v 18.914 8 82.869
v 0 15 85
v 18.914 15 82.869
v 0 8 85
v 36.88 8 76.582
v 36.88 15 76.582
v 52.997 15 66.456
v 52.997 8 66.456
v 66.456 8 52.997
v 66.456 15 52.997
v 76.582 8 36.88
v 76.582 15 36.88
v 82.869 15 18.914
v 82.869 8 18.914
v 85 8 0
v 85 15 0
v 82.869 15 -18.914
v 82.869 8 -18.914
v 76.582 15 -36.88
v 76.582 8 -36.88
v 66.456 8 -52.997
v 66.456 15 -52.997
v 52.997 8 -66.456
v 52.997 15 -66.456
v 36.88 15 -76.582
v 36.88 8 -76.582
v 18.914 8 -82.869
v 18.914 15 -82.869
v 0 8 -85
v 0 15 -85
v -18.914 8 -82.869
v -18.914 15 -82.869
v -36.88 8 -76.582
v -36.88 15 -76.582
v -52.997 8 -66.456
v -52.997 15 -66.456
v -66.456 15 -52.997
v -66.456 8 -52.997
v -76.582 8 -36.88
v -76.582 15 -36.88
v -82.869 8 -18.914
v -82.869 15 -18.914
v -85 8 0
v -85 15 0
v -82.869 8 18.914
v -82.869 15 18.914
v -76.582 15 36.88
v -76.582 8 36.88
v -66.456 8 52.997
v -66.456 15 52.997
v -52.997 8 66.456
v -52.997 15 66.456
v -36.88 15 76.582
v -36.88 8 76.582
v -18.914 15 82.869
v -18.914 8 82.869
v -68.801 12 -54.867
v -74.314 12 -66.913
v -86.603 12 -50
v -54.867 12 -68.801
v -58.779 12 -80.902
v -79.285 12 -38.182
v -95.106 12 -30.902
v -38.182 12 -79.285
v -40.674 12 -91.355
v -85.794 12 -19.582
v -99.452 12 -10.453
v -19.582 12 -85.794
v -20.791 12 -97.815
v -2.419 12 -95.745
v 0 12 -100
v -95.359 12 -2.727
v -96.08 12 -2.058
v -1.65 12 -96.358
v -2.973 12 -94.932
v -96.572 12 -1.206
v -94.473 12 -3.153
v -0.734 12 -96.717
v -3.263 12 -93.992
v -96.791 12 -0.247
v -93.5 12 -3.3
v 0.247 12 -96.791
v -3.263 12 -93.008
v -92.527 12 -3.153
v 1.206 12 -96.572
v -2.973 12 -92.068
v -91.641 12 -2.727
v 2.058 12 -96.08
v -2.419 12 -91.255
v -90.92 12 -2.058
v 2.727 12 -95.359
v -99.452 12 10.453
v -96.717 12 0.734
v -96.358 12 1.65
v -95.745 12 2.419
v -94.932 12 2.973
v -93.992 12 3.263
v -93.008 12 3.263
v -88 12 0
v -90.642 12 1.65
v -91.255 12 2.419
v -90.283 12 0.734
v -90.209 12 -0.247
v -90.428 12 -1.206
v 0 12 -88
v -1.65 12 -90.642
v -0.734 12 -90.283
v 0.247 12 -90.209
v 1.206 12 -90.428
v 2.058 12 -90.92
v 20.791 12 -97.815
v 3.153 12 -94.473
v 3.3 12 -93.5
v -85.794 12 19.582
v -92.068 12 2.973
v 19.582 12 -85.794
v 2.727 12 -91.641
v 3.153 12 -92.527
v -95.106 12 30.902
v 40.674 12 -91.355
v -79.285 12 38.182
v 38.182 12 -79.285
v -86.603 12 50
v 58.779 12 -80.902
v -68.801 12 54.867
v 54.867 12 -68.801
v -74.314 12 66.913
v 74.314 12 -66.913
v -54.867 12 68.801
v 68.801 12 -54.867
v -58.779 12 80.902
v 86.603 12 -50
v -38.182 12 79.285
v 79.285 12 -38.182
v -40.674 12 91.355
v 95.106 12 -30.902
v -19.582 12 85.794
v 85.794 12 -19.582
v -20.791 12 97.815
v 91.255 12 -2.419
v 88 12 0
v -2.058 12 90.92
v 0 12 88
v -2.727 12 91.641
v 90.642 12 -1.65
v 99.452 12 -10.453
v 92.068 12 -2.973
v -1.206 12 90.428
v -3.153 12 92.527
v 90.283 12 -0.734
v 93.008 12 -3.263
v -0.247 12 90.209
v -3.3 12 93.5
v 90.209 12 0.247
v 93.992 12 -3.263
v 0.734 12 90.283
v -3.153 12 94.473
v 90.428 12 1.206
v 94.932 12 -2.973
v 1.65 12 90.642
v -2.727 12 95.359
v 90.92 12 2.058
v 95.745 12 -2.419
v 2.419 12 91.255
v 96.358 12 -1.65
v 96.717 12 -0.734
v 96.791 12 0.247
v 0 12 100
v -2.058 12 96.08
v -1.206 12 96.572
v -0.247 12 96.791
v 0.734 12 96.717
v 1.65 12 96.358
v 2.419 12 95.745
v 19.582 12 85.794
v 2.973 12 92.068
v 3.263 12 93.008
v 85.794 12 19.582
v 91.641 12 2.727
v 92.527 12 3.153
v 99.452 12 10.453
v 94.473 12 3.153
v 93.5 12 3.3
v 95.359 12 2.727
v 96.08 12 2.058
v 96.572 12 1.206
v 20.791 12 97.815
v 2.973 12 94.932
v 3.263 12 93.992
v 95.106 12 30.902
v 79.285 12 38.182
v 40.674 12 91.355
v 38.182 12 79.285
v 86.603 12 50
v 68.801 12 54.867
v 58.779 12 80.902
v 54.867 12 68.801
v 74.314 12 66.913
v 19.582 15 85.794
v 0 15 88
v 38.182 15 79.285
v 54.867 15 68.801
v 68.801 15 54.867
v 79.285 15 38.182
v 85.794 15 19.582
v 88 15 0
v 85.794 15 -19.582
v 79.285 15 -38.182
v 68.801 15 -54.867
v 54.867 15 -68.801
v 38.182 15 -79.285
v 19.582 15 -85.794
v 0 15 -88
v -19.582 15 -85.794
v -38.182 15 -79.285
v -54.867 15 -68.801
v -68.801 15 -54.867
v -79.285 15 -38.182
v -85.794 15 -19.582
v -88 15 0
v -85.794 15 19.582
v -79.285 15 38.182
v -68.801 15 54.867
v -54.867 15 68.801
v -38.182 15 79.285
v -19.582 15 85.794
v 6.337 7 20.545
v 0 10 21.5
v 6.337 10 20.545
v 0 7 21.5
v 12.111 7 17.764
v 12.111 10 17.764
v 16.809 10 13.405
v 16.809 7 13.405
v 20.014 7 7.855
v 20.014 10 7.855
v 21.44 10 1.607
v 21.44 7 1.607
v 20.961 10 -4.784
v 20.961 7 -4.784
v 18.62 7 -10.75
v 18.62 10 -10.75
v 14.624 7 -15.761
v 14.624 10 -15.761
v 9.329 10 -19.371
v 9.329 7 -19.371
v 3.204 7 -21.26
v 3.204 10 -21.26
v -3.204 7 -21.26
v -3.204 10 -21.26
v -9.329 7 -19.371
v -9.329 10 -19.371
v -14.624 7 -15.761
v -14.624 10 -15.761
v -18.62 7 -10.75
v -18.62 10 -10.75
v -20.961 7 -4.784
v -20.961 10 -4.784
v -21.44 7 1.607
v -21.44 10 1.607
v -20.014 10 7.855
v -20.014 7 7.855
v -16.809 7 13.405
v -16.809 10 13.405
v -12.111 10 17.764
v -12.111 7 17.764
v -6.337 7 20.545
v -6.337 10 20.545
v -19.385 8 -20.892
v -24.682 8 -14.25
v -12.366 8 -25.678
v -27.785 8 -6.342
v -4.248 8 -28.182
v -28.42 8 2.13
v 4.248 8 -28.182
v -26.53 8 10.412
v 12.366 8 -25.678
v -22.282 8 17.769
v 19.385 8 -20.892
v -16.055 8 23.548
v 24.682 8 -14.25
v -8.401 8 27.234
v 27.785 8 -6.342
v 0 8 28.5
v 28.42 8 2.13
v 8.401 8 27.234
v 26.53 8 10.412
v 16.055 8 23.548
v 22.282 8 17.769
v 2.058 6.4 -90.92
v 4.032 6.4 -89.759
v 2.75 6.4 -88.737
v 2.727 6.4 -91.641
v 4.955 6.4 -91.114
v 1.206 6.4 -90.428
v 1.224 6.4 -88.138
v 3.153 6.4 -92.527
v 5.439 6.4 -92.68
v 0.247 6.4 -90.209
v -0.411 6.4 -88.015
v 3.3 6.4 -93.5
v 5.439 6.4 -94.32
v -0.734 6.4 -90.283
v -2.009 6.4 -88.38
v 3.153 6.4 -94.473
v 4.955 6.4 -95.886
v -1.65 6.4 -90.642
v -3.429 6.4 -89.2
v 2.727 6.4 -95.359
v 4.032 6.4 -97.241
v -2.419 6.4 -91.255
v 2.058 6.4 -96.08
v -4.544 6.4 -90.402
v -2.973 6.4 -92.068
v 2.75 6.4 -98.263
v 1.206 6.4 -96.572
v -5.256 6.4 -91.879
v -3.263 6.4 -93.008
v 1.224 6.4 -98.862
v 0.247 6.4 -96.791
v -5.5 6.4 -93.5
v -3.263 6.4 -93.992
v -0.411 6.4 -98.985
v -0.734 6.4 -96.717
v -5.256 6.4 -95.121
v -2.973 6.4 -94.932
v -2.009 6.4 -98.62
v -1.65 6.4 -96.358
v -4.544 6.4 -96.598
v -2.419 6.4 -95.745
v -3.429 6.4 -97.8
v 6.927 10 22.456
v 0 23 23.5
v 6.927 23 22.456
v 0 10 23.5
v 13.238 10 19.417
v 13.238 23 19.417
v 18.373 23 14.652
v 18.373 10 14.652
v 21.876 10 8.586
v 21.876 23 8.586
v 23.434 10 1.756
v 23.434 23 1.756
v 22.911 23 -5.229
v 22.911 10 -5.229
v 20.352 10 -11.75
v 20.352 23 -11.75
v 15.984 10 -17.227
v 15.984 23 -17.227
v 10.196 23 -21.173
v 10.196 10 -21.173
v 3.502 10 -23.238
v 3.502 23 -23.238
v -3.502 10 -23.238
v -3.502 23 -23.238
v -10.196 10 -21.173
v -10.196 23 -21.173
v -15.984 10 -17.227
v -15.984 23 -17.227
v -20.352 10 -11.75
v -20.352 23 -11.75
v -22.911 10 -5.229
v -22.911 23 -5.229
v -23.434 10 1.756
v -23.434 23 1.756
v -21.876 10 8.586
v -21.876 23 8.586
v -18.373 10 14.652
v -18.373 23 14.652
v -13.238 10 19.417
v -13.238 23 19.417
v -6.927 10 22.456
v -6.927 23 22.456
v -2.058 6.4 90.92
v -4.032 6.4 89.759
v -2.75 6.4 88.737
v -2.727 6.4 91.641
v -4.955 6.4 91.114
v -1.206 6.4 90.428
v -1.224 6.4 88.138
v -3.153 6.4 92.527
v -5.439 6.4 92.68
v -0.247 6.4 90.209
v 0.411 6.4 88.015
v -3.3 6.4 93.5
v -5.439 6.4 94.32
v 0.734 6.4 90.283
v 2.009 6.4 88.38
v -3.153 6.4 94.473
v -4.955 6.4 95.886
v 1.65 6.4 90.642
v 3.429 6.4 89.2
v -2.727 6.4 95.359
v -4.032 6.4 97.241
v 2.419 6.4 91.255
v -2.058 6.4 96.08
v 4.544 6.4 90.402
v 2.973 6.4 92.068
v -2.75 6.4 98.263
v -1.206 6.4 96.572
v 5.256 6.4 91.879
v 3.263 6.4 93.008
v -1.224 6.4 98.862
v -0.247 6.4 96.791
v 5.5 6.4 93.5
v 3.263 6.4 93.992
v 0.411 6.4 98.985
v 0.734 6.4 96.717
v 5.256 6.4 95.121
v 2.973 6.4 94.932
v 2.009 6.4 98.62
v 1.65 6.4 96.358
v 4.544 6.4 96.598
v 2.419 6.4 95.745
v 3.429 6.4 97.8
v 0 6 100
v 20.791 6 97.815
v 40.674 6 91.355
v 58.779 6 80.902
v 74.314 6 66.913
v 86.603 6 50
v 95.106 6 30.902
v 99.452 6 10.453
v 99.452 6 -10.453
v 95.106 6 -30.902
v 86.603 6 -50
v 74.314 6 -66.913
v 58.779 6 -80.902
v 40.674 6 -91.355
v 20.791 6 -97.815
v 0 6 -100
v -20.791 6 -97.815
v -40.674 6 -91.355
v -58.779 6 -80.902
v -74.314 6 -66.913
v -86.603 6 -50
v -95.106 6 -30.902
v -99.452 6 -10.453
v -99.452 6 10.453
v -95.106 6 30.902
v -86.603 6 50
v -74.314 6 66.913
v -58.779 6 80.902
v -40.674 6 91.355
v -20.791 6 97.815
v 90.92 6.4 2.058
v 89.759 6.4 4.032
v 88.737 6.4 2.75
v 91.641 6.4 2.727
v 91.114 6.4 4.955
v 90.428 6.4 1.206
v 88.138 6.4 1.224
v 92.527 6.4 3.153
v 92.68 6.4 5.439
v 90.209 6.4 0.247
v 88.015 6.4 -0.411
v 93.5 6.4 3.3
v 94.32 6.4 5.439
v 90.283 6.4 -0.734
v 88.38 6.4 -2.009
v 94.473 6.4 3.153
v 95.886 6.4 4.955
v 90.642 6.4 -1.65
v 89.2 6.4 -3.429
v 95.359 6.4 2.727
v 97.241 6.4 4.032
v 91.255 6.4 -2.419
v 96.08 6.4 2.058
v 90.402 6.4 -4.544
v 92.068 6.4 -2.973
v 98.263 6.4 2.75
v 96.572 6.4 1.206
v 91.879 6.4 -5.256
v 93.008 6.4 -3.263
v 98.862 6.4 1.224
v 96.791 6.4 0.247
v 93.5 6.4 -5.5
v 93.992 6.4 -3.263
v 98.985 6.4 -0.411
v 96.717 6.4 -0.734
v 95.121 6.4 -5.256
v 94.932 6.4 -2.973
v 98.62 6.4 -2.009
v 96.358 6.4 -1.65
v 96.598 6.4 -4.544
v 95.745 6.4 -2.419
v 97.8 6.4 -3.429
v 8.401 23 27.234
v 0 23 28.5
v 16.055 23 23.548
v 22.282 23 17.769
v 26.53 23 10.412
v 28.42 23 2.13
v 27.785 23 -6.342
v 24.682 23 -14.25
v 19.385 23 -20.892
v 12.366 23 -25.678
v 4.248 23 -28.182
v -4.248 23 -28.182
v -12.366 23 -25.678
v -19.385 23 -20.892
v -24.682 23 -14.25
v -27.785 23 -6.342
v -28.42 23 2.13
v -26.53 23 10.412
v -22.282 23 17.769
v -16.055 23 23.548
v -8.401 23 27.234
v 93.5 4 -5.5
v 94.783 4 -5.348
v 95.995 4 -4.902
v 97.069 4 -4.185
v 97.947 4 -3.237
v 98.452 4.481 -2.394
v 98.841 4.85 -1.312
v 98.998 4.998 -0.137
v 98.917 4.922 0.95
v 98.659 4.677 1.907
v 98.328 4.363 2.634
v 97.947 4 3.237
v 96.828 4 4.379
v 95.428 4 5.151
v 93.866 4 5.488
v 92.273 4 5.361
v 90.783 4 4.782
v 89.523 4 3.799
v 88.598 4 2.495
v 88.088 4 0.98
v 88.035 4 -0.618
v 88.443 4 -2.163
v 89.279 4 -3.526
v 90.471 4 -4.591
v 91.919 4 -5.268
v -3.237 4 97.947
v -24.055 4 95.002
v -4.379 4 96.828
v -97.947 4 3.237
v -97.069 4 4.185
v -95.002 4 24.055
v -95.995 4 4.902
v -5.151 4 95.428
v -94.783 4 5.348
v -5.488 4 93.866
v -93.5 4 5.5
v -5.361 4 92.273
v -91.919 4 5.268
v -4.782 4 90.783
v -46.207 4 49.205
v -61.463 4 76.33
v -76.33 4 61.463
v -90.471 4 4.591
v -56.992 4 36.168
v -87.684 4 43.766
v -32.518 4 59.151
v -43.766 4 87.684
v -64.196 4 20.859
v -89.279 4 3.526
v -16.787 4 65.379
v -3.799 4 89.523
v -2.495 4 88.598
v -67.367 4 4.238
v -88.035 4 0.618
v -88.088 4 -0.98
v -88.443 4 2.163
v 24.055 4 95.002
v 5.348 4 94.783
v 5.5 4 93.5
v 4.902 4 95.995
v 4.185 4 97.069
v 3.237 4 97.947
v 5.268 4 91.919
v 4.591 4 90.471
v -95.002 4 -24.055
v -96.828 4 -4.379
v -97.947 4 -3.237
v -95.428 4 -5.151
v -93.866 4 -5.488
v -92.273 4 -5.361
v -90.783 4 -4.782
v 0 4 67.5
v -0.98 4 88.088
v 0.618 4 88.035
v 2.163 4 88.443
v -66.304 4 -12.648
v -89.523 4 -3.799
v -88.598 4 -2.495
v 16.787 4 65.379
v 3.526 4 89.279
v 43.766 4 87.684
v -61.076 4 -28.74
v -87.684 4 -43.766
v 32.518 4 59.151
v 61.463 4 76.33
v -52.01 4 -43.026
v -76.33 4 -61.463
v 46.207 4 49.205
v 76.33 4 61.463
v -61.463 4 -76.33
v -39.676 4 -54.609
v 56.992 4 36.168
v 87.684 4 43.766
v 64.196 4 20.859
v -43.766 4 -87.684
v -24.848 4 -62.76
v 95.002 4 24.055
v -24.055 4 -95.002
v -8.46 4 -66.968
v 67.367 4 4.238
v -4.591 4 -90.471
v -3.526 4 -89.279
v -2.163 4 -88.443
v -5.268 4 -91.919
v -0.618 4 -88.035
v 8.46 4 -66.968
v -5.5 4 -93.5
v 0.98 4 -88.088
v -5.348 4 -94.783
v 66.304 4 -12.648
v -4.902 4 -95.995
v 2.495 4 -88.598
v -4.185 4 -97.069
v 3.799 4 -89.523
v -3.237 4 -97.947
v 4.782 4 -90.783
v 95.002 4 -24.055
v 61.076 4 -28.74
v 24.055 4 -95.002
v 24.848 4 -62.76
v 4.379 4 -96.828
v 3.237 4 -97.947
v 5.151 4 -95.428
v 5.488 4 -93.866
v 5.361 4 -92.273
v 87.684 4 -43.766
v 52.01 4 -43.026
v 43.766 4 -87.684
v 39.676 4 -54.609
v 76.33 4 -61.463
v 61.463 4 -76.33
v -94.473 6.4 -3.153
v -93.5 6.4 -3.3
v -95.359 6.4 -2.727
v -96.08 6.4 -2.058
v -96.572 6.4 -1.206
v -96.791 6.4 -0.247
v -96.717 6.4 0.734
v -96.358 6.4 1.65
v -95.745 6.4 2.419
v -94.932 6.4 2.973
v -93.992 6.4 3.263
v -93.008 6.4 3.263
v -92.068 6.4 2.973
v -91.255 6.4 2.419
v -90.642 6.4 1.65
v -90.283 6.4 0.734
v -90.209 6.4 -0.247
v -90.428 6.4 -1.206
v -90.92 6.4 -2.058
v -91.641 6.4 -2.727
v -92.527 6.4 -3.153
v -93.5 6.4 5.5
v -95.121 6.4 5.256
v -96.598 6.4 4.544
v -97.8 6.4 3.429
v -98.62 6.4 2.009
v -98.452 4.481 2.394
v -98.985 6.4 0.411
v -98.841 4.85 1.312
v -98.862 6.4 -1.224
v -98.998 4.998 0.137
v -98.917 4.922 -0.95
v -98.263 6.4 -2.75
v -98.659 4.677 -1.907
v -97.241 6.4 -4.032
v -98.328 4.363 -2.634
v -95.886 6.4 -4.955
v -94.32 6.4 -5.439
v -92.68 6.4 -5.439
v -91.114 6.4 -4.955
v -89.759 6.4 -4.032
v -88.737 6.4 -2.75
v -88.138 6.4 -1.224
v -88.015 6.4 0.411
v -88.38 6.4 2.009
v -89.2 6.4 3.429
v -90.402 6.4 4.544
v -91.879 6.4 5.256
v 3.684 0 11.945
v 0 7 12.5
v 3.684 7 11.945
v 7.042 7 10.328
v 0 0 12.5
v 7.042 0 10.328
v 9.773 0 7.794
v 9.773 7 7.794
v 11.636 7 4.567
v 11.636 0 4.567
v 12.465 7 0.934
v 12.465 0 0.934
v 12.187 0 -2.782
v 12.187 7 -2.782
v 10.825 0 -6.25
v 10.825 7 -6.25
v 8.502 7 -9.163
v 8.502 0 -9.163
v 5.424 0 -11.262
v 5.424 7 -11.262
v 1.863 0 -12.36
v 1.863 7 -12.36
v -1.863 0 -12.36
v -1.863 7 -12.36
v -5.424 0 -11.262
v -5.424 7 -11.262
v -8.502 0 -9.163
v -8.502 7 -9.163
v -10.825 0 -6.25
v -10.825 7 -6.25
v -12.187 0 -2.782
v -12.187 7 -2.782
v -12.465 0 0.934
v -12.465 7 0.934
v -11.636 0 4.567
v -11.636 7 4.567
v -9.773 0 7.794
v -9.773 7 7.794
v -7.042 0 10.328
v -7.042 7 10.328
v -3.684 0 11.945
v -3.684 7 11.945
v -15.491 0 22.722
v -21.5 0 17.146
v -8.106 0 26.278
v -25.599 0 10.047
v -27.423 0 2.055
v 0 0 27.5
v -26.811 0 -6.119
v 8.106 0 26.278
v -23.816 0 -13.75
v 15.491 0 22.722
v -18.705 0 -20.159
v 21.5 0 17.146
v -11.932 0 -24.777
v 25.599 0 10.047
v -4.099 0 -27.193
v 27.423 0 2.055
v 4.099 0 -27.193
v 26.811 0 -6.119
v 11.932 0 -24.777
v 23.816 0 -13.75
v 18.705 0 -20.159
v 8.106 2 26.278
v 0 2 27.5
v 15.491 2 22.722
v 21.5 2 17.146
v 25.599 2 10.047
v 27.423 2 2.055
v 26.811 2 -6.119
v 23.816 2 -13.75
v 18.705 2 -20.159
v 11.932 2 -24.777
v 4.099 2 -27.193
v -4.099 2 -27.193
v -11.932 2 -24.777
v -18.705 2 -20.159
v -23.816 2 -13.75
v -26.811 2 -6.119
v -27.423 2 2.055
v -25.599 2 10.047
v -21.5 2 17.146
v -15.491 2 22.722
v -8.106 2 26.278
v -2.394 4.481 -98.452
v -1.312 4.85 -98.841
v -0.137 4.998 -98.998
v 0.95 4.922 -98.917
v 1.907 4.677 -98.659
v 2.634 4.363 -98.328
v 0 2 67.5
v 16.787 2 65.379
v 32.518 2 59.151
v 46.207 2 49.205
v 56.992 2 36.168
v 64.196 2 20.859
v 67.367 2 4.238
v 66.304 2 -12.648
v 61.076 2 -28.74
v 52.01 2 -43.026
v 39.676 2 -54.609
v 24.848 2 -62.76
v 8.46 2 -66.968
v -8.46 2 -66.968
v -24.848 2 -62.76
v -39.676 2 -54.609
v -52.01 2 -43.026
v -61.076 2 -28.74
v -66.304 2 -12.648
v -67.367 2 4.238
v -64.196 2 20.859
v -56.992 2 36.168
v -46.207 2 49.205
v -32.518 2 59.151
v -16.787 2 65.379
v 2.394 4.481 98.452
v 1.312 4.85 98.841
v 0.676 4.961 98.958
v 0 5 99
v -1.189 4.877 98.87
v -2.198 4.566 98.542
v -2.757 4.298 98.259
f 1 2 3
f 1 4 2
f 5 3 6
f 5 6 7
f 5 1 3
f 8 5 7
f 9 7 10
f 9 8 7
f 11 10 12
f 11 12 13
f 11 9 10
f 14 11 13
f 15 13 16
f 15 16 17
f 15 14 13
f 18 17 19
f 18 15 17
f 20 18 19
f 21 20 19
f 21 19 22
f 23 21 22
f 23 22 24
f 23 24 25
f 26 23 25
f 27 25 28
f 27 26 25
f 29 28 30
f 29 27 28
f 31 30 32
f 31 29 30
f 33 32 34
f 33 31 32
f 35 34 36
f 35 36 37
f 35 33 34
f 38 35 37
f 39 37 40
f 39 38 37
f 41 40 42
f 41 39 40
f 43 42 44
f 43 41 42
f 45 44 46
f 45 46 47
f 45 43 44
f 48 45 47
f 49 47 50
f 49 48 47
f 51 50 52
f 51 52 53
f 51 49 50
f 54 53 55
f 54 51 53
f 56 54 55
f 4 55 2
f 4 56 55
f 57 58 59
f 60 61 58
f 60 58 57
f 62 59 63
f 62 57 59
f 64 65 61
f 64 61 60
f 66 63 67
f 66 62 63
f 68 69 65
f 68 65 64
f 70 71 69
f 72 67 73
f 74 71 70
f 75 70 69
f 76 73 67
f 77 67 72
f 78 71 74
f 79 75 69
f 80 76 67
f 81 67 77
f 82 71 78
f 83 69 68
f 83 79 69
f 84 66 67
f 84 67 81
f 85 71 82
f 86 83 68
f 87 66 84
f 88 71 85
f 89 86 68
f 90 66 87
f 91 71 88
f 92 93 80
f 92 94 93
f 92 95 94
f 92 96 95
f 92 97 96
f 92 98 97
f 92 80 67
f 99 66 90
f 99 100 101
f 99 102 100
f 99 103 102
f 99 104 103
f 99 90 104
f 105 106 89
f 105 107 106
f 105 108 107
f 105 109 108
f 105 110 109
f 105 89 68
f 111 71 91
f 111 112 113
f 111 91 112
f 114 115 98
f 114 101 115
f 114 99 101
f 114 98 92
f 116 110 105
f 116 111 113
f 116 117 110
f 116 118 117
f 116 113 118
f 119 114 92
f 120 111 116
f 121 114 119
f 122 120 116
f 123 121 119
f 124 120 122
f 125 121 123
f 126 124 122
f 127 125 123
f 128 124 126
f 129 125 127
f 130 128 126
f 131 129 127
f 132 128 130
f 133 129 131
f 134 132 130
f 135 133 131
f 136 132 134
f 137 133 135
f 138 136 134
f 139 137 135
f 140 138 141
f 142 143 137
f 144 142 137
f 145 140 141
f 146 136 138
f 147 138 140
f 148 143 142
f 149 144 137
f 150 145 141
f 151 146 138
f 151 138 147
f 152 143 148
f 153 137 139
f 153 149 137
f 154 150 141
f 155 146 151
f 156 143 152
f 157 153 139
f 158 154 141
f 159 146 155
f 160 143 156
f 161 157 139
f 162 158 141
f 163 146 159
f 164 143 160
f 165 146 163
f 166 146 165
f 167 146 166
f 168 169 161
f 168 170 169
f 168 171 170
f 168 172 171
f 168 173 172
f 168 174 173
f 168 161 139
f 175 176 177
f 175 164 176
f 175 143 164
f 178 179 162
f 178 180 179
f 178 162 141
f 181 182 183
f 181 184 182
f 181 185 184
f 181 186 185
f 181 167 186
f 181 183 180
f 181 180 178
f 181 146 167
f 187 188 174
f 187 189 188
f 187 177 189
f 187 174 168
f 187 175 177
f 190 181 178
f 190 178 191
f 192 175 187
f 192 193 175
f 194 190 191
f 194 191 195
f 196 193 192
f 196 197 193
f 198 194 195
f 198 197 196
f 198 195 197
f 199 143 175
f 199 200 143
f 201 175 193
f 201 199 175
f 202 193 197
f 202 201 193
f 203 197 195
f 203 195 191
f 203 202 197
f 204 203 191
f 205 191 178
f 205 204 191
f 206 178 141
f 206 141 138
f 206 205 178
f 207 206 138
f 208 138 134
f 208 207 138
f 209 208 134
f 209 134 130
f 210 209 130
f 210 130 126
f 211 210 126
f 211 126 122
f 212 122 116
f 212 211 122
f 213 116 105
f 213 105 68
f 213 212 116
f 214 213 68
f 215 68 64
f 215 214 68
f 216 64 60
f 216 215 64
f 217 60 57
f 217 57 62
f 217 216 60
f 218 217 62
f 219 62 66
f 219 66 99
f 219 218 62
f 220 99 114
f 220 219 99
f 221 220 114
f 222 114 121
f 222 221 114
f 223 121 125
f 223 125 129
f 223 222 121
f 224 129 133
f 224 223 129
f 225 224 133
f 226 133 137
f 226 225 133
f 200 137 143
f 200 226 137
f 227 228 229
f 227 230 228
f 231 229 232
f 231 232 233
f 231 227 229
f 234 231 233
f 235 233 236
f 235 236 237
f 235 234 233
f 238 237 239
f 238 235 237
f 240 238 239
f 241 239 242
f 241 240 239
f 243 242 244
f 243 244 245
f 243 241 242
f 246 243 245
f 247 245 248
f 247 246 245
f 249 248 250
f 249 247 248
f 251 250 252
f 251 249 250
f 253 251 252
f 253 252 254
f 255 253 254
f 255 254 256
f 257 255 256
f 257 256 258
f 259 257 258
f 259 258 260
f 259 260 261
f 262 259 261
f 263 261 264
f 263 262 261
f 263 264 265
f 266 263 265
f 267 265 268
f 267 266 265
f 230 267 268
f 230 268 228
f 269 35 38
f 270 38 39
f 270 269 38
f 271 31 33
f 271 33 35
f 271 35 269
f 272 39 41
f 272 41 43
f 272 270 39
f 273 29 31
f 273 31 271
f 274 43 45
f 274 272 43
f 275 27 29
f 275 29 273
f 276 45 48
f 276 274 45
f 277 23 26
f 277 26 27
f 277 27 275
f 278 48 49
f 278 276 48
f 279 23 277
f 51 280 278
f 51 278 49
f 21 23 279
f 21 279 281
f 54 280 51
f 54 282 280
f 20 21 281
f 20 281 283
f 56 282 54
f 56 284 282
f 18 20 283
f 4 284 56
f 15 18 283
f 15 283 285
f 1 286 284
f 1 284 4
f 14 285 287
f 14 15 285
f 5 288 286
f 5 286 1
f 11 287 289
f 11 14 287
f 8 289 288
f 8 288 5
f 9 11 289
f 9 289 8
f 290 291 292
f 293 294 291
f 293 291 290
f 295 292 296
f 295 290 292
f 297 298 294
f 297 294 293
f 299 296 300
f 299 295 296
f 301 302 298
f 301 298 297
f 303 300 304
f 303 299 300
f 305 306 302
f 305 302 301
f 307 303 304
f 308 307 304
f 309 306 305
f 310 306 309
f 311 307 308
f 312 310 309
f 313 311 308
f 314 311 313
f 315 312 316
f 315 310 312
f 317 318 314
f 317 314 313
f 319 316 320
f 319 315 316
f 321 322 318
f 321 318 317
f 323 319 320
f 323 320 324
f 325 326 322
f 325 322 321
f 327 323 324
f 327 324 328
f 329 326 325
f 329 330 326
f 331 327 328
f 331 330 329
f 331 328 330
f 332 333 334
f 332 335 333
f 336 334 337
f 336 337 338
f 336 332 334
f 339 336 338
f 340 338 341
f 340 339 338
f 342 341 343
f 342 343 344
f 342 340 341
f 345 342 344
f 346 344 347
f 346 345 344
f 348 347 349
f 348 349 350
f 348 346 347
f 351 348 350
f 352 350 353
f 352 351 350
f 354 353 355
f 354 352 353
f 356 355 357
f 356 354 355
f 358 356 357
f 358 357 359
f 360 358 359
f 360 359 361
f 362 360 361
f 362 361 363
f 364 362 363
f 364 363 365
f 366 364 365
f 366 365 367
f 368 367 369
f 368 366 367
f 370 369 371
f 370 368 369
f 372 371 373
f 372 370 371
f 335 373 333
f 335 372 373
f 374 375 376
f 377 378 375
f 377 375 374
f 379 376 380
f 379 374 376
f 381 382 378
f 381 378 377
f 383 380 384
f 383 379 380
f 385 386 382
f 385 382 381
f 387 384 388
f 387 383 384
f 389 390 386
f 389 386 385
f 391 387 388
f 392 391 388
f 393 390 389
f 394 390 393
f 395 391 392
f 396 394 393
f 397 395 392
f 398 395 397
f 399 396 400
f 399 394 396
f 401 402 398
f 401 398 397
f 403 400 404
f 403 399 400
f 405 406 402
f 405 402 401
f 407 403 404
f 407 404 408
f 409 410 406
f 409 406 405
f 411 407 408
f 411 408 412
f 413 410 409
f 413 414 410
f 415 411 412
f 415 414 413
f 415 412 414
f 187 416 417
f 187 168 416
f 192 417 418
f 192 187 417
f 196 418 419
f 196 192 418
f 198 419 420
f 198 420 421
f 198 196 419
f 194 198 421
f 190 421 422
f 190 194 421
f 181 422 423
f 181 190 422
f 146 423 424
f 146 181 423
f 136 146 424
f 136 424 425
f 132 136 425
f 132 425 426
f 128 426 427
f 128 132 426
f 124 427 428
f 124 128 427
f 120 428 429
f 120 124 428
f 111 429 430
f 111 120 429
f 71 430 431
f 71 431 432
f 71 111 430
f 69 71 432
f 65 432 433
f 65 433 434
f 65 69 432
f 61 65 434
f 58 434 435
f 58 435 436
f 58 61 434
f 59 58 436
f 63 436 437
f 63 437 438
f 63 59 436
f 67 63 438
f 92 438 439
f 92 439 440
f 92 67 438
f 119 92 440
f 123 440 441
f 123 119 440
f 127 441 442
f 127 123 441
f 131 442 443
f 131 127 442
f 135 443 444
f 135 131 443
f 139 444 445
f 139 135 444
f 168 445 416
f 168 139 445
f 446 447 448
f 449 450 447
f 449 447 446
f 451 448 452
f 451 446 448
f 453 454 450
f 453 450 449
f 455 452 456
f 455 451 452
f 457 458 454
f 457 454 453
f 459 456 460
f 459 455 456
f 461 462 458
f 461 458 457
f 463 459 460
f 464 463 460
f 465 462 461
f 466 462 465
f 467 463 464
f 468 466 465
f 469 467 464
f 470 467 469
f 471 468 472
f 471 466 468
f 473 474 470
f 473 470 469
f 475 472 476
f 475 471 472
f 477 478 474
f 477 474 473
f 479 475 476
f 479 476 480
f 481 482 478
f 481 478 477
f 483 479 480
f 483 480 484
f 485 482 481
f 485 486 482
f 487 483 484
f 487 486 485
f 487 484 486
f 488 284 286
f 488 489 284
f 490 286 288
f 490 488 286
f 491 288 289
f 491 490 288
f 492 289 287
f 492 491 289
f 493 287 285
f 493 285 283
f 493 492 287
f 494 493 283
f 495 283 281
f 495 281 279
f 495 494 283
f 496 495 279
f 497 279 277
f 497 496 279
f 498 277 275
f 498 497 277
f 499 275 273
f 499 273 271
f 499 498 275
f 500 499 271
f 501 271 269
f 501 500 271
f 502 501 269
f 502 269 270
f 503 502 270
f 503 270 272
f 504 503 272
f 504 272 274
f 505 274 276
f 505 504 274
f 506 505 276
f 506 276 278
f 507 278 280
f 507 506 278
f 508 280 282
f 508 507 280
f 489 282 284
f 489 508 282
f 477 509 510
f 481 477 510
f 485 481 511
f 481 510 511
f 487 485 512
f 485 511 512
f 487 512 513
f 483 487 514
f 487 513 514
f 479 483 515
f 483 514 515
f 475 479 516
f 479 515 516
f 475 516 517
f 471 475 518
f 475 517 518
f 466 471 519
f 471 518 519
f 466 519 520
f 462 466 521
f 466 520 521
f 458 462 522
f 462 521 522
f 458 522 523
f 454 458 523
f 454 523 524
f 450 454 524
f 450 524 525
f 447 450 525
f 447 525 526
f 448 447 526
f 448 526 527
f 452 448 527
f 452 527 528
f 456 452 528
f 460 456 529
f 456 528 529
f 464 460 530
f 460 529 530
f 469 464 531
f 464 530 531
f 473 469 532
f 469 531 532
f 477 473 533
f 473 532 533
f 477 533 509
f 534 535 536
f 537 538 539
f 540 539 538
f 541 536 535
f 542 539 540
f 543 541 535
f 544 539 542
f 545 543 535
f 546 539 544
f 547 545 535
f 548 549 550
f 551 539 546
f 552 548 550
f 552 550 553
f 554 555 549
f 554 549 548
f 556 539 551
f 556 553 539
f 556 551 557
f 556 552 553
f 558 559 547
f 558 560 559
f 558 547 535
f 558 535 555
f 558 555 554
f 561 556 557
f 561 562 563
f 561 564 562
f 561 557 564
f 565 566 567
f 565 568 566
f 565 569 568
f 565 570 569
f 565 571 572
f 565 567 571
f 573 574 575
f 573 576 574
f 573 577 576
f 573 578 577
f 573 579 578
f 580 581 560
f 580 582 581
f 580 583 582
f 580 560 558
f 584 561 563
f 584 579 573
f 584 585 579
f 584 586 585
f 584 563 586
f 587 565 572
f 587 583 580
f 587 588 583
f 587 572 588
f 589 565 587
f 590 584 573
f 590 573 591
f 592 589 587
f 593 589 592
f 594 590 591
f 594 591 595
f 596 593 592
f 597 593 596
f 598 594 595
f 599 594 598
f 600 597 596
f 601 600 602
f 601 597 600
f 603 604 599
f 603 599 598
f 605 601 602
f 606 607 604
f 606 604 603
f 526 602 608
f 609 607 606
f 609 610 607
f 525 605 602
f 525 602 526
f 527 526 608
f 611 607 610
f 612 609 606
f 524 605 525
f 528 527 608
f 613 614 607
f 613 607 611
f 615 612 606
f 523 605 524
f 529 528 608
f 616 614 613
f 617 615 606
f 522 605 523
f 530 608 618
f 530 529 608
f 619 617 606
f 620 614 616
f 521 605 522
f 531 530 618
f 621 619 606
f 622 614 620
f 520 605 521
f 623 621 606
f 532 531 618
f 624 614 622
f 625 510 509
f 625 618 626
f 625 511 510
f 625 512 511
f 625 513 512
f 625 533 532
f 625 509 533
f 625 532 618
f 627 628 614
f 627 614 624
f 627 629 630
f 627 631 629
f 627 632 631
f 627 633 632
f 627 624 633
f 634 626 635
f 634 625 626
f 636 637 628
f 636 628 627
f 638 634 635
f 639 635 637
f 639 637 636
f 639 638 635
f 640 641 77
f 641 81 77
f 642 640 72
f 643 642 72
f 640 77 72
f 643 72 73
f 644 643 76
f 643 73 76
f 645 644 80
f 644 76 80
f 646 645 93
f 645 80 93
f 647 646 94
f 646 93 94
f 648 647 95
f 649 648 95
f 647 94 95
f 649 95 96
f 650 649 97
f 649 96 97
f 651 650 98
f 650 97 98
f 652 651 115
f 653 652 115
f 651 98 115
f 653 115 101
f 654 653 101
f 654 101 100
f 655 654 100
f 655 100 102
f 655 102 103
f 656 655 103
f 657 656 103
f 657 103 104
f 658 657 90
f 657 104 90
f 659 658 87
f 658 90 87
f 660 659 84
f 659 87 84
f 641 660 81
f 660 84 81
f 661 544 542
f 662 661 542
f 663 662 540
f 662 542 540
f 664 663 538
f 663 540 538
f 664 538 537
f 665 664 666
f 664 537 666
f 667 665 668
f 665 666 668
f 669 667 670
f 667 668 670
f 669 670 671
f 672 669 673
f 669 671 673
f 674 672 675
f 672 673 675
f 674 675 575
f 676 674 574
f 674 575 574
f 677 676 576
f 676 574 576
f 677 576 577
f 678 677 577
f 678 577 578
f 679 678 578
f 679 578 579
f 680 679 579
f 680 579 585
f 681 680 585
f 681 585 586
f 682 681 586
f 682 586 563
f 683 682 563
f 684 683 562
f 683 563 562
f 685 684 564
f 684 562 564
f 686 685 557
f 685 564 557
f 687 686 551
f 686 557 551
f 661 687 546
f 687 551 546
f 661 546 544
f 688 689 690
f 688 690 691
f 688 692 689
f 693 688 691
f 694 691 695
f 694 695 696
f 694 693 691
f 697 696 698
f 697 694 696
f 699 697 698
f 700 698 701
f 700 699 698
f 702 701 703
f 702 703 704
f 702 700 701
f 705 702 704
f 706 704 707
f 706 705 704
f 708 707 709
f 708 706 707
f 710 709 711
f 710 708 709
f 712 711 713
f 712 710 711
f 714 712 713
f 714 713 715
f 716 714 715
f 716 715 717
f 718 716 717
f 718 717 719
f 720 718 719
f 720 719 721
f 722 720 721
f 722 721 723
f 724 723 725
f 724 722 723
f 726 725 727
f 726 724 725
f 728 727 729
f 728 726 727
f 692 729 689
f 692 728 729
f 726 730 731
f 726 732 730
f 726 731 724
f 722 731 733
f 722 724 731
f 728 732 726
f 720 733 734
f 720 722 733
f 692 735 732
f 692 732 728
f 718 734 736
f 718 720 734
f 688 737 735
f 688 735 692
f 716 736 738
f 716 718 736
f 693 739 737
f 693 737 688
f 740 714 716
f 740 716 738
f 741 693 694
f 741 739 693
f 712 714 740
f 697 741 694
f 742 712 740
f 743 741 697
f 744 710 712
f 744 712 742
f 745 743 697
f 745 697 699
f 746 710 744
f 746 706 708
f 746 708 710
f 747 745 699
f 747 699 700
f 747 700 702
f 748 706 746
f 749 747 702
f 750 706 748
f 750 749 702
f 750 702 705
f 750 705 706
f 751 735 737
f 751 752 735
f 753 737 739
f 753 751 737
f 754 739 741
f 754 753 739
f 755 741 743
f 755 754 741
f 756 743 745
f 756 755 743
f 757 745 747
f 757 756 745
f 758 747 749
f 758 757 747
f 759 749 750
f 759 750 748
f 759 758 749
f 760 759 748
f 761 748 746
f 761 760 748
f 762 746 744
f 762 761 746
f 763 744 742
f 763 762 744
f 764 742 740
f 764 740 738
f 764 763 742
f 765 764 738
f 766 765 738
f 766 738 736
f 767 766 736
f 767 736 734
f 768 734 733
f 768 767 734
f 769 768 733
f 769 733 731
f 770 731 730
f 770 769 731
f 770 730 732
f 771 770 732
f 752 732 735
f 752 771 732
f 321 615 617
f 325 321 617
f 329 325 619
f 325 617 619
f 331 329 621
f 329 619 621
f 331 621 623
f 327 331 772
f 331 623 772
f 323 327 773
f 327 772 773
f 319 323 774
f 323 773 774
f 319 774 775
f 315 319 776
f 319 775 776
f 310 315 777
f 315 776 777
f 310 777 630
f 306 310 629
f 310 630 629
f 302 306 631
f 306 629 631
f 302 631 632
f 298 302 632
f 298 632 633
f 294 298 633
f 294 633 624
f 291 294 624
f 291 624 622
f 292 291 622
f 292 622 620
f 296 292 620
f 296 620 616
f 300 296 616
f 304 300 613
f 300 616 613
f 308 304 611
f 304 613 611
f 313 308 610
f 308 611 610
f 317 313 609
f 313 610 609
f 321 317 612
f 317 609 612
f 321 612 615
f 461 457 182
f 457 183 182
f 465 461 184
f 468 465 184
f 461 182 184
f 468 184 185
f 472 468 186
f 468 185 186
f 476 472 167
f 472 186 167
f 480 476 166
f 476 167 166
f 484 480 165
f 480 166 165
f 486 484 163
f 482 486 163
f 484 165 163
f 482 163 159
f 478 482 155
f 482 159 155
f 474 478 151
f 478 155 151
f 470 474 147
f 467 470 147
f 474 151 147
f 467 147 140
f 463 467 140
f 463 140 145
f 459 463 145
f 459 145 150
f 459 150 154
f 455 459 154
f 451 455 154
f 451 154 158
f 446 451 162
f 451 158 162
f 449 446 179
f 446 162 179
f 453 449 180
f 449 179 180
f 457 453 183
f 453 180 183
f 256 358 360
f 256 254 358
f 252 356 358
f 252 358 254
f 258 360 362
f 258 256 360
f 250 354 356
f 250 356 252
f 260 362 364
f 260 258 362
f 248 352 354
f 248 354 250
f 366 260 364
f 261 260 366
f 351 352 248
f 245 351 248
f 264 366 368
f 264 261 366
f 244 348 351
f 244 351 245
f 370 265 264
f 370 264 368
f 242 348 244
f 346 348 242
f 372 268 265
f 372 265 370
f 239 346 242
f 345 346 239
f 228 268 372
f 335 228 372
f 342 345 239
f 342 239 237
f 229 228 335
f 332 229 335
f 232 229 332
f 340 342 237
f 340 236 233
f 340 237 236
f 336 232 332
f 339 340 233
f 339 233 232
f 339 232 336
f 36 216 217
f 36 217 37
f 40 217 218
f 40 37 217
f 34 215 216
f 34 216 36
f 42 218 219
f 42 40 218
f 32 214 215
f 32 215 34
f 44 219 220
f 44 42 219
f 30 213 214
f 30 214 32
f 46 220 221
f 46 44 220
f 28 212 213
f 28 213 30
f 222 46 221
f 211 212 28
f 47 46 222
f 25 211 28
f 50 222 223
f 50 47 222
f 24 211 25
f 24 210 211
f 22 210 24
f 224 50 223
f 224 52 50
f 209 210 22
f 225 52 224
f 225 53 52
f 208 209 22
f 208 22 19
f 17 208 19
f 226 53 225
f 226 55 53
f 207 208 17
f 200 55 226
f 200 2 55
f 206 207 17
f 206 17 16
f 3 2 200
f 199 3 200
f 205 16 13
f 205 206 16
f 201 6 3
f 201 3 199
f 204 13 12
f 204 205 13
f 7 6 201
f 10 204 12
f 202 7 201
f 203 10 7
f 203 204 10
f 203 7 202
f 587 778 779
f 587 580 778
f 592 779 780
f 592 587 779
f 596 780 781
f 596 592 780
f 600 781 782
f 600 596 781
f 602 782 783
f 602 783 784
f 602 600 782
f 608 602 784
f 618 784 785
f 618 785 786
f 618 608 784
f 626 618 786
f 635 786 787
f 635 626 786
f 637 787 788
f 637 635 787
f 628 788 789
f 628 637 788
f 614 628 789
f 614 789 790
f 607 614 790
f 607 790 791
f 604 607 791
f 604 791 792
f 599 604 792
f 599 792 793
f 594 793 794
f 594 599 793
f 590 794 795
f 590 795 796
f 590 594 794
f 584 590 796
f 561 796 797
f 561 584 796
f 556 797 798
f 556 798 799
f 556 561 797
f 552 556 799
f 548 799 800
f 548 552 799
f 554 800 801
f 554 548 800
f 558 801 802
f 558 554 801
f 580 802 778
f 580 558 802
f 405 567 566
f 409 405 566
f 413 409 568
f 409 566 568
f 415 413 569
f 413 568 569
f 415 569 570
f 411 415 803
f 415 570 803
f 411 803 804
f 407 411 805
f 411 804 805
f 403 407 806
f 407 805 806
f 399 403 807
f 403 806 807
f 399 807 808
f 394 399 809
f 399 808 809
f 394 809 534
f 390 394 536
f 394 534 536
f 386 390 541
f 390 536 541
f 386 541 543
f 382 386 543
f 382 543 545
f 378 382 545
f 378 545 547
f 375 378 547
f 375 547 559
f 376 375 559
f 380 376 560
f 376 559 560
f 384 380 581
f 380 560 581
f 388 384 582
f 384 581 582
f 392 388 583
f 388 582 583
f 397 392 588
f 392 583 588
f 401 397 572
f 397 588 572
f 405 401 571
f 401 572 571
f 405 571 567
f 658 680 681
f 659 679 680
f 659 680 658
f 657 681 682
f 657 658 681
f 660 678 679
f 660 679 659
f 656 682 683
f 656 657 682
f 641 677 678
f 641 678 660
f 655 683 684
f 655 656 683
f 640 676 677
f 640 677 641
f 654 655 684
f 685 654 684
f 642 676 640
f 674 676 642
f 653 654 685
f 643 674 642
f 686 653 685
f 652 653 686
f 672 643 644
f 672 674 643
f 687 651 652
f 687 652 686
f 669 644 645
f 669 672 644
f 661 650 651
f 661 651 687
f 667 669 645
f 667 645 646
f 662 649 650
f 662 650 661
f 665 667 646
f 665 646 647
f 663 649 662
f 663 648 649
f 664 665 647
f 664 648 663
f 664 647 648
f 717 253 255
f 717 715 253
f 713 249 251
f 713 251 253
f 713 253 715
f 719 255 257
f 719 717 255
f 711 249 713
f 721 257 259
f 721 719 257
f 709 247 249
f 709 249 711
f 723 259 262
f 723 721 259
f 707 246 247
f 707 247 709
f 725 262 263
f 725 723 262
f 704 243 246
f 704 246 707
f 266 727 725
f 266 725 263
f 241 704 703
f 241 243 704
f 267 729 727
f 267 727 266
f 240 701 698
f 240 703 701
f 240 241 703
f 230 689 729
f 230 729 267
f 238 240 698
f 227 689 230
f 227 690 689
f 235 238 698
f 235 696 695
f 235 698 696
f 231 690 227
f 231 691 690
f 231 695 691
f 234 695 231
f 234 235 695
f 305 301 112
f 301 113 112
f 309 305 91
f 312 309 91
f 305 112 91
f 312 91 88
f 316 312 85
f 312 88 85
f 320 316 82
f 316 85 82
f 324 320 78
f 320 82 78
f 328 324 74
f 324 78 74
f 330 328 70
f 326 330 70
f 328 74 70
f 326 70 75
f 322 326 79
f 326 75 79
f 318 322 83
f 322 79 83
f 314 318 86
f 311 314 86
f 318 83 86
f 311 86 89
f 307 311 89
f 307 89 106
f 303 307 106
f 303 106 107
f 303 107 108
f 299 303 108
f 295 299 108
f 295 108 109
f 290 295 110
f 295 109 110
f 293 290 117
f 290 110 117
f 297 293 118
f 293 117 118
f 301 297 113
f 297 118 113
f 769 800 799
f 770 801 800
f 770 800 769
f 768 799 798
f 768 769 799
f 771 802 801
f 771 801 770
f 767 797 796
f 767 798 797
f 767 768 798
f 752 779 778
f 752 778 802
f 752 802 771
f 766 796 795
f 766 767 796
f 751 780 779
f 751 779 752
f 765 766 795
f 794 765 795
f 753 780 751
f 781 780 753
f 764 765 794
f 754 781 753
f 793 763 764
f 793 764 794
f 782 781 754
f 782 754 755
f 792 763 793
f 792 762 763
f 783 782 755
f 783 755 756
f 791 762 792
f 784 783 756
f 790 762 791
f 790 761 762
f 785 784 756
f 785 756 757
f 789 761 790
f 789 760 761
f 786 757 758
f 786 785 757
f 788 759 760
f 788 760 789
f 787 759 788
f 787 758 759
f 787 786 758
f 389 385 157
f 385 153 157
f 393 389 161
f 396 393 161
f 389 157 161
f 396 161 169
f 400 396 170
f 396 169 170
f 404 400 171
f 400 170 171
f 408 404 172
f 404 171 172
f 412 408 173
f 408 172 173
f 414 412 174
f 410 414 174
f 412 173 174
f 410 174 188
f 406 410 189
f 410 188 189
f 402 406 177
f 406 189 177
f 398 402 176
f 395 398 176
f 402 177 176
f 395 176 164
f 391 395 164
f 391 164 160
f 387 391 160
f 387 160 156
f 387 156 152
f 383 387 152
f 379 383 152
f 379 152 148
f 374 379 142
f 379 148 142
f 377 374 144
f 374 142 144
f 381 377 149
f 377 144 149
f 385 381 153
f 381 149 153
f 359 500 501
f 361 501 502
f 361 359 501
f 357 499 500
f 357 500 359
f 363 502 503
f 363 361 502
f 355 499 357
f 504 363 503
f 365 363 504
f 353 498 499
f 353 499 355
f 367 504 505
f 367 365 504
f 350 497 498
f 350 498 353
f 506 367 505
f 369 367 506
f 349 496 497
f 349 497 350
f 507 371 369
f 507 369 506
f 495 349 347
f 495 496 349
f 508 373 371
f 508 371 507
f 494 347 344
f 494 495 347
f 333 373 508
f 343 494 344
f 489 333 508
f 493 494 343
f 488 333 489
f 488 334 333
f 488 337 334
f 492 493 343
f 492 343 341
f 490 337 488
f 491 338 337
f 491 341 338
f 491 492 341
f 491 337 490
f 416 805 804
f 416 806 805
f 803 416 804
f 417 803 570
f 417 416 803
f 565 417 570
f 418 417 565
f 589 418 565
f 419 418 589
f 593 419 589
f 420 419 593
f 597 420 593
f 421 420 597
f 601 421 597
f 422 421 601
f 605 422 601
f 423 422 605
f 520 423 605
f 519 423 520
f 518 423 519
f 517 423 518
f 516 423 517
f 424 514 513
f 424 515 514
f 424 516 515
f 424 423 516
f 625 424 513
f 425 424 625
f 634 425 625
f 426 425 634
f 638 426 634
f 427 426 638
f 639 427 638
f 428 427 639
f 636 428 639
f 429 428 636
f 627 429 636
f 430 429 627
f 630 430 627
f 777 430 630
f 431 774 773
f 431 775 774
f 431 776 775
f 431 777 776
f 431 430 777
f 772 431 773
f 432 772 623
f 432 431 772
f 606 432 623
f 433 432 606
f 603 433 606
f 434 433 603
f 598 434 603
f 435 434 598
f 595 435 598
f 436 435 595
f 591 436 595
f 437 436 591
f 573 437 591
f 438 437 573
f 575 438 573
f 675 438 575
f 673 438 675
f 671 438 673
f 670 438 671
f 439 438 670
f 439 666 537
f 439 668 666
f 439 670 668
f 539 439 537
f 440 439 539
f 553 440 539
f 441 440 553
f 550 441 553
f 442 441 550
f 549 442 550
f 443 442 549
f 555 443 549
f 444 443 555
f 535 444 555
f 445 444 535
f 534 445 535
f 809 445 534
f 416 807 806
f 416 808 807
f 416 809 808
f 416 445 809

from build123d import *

# Parameters (mm, degrees)
HOLE_D             = 6.6
HOLE_CBORE_D       = 11
HOLE_CBORE_DEPTH   = 6.4
POLARPATTERN_COUNT = 4


with BuildPart() as part:
    # Sketch → Revolution (revolve)
    with BuildSketch(Plane.YZ):
        Polygon((6, 100), (12, 100), (12, 88), (15, 88), (15, 85), (8, 85), (8, 28.5), (23, 28.5), (23, 23.5), (10, 23.5), (10, 21.5), (7, 21.5), (7, 12.5), (0, 12.5), (0, 27.5), (2, 27.5), (2, 67.5), (4, 67.5), (4, 98), align=None)
    revolve(axis=Axis((0, 0, 0), (0, 1, 0)))

    # Hole (through all)
    with Locations(Plane.XZ):
        with Locations((0, 93.5)):
            hole = CounterBoreHole(HOLE_D / 2, HOLE_CBORE_D / 2, HOLE_CBORE_DEPTH)

    # PolarPattern: Hole ×4 about axis
    polarpattern_axis = Axis((0, 0, 0), (0, 1, 0))
    for i in range(1, POLARPATTERN_COUNT):
        add(hole.rotate(polarpattern_axis, i * 360 / POLARPATTERN_COUNT), mode=Mode.SUBTRACT)


solid = part.part
